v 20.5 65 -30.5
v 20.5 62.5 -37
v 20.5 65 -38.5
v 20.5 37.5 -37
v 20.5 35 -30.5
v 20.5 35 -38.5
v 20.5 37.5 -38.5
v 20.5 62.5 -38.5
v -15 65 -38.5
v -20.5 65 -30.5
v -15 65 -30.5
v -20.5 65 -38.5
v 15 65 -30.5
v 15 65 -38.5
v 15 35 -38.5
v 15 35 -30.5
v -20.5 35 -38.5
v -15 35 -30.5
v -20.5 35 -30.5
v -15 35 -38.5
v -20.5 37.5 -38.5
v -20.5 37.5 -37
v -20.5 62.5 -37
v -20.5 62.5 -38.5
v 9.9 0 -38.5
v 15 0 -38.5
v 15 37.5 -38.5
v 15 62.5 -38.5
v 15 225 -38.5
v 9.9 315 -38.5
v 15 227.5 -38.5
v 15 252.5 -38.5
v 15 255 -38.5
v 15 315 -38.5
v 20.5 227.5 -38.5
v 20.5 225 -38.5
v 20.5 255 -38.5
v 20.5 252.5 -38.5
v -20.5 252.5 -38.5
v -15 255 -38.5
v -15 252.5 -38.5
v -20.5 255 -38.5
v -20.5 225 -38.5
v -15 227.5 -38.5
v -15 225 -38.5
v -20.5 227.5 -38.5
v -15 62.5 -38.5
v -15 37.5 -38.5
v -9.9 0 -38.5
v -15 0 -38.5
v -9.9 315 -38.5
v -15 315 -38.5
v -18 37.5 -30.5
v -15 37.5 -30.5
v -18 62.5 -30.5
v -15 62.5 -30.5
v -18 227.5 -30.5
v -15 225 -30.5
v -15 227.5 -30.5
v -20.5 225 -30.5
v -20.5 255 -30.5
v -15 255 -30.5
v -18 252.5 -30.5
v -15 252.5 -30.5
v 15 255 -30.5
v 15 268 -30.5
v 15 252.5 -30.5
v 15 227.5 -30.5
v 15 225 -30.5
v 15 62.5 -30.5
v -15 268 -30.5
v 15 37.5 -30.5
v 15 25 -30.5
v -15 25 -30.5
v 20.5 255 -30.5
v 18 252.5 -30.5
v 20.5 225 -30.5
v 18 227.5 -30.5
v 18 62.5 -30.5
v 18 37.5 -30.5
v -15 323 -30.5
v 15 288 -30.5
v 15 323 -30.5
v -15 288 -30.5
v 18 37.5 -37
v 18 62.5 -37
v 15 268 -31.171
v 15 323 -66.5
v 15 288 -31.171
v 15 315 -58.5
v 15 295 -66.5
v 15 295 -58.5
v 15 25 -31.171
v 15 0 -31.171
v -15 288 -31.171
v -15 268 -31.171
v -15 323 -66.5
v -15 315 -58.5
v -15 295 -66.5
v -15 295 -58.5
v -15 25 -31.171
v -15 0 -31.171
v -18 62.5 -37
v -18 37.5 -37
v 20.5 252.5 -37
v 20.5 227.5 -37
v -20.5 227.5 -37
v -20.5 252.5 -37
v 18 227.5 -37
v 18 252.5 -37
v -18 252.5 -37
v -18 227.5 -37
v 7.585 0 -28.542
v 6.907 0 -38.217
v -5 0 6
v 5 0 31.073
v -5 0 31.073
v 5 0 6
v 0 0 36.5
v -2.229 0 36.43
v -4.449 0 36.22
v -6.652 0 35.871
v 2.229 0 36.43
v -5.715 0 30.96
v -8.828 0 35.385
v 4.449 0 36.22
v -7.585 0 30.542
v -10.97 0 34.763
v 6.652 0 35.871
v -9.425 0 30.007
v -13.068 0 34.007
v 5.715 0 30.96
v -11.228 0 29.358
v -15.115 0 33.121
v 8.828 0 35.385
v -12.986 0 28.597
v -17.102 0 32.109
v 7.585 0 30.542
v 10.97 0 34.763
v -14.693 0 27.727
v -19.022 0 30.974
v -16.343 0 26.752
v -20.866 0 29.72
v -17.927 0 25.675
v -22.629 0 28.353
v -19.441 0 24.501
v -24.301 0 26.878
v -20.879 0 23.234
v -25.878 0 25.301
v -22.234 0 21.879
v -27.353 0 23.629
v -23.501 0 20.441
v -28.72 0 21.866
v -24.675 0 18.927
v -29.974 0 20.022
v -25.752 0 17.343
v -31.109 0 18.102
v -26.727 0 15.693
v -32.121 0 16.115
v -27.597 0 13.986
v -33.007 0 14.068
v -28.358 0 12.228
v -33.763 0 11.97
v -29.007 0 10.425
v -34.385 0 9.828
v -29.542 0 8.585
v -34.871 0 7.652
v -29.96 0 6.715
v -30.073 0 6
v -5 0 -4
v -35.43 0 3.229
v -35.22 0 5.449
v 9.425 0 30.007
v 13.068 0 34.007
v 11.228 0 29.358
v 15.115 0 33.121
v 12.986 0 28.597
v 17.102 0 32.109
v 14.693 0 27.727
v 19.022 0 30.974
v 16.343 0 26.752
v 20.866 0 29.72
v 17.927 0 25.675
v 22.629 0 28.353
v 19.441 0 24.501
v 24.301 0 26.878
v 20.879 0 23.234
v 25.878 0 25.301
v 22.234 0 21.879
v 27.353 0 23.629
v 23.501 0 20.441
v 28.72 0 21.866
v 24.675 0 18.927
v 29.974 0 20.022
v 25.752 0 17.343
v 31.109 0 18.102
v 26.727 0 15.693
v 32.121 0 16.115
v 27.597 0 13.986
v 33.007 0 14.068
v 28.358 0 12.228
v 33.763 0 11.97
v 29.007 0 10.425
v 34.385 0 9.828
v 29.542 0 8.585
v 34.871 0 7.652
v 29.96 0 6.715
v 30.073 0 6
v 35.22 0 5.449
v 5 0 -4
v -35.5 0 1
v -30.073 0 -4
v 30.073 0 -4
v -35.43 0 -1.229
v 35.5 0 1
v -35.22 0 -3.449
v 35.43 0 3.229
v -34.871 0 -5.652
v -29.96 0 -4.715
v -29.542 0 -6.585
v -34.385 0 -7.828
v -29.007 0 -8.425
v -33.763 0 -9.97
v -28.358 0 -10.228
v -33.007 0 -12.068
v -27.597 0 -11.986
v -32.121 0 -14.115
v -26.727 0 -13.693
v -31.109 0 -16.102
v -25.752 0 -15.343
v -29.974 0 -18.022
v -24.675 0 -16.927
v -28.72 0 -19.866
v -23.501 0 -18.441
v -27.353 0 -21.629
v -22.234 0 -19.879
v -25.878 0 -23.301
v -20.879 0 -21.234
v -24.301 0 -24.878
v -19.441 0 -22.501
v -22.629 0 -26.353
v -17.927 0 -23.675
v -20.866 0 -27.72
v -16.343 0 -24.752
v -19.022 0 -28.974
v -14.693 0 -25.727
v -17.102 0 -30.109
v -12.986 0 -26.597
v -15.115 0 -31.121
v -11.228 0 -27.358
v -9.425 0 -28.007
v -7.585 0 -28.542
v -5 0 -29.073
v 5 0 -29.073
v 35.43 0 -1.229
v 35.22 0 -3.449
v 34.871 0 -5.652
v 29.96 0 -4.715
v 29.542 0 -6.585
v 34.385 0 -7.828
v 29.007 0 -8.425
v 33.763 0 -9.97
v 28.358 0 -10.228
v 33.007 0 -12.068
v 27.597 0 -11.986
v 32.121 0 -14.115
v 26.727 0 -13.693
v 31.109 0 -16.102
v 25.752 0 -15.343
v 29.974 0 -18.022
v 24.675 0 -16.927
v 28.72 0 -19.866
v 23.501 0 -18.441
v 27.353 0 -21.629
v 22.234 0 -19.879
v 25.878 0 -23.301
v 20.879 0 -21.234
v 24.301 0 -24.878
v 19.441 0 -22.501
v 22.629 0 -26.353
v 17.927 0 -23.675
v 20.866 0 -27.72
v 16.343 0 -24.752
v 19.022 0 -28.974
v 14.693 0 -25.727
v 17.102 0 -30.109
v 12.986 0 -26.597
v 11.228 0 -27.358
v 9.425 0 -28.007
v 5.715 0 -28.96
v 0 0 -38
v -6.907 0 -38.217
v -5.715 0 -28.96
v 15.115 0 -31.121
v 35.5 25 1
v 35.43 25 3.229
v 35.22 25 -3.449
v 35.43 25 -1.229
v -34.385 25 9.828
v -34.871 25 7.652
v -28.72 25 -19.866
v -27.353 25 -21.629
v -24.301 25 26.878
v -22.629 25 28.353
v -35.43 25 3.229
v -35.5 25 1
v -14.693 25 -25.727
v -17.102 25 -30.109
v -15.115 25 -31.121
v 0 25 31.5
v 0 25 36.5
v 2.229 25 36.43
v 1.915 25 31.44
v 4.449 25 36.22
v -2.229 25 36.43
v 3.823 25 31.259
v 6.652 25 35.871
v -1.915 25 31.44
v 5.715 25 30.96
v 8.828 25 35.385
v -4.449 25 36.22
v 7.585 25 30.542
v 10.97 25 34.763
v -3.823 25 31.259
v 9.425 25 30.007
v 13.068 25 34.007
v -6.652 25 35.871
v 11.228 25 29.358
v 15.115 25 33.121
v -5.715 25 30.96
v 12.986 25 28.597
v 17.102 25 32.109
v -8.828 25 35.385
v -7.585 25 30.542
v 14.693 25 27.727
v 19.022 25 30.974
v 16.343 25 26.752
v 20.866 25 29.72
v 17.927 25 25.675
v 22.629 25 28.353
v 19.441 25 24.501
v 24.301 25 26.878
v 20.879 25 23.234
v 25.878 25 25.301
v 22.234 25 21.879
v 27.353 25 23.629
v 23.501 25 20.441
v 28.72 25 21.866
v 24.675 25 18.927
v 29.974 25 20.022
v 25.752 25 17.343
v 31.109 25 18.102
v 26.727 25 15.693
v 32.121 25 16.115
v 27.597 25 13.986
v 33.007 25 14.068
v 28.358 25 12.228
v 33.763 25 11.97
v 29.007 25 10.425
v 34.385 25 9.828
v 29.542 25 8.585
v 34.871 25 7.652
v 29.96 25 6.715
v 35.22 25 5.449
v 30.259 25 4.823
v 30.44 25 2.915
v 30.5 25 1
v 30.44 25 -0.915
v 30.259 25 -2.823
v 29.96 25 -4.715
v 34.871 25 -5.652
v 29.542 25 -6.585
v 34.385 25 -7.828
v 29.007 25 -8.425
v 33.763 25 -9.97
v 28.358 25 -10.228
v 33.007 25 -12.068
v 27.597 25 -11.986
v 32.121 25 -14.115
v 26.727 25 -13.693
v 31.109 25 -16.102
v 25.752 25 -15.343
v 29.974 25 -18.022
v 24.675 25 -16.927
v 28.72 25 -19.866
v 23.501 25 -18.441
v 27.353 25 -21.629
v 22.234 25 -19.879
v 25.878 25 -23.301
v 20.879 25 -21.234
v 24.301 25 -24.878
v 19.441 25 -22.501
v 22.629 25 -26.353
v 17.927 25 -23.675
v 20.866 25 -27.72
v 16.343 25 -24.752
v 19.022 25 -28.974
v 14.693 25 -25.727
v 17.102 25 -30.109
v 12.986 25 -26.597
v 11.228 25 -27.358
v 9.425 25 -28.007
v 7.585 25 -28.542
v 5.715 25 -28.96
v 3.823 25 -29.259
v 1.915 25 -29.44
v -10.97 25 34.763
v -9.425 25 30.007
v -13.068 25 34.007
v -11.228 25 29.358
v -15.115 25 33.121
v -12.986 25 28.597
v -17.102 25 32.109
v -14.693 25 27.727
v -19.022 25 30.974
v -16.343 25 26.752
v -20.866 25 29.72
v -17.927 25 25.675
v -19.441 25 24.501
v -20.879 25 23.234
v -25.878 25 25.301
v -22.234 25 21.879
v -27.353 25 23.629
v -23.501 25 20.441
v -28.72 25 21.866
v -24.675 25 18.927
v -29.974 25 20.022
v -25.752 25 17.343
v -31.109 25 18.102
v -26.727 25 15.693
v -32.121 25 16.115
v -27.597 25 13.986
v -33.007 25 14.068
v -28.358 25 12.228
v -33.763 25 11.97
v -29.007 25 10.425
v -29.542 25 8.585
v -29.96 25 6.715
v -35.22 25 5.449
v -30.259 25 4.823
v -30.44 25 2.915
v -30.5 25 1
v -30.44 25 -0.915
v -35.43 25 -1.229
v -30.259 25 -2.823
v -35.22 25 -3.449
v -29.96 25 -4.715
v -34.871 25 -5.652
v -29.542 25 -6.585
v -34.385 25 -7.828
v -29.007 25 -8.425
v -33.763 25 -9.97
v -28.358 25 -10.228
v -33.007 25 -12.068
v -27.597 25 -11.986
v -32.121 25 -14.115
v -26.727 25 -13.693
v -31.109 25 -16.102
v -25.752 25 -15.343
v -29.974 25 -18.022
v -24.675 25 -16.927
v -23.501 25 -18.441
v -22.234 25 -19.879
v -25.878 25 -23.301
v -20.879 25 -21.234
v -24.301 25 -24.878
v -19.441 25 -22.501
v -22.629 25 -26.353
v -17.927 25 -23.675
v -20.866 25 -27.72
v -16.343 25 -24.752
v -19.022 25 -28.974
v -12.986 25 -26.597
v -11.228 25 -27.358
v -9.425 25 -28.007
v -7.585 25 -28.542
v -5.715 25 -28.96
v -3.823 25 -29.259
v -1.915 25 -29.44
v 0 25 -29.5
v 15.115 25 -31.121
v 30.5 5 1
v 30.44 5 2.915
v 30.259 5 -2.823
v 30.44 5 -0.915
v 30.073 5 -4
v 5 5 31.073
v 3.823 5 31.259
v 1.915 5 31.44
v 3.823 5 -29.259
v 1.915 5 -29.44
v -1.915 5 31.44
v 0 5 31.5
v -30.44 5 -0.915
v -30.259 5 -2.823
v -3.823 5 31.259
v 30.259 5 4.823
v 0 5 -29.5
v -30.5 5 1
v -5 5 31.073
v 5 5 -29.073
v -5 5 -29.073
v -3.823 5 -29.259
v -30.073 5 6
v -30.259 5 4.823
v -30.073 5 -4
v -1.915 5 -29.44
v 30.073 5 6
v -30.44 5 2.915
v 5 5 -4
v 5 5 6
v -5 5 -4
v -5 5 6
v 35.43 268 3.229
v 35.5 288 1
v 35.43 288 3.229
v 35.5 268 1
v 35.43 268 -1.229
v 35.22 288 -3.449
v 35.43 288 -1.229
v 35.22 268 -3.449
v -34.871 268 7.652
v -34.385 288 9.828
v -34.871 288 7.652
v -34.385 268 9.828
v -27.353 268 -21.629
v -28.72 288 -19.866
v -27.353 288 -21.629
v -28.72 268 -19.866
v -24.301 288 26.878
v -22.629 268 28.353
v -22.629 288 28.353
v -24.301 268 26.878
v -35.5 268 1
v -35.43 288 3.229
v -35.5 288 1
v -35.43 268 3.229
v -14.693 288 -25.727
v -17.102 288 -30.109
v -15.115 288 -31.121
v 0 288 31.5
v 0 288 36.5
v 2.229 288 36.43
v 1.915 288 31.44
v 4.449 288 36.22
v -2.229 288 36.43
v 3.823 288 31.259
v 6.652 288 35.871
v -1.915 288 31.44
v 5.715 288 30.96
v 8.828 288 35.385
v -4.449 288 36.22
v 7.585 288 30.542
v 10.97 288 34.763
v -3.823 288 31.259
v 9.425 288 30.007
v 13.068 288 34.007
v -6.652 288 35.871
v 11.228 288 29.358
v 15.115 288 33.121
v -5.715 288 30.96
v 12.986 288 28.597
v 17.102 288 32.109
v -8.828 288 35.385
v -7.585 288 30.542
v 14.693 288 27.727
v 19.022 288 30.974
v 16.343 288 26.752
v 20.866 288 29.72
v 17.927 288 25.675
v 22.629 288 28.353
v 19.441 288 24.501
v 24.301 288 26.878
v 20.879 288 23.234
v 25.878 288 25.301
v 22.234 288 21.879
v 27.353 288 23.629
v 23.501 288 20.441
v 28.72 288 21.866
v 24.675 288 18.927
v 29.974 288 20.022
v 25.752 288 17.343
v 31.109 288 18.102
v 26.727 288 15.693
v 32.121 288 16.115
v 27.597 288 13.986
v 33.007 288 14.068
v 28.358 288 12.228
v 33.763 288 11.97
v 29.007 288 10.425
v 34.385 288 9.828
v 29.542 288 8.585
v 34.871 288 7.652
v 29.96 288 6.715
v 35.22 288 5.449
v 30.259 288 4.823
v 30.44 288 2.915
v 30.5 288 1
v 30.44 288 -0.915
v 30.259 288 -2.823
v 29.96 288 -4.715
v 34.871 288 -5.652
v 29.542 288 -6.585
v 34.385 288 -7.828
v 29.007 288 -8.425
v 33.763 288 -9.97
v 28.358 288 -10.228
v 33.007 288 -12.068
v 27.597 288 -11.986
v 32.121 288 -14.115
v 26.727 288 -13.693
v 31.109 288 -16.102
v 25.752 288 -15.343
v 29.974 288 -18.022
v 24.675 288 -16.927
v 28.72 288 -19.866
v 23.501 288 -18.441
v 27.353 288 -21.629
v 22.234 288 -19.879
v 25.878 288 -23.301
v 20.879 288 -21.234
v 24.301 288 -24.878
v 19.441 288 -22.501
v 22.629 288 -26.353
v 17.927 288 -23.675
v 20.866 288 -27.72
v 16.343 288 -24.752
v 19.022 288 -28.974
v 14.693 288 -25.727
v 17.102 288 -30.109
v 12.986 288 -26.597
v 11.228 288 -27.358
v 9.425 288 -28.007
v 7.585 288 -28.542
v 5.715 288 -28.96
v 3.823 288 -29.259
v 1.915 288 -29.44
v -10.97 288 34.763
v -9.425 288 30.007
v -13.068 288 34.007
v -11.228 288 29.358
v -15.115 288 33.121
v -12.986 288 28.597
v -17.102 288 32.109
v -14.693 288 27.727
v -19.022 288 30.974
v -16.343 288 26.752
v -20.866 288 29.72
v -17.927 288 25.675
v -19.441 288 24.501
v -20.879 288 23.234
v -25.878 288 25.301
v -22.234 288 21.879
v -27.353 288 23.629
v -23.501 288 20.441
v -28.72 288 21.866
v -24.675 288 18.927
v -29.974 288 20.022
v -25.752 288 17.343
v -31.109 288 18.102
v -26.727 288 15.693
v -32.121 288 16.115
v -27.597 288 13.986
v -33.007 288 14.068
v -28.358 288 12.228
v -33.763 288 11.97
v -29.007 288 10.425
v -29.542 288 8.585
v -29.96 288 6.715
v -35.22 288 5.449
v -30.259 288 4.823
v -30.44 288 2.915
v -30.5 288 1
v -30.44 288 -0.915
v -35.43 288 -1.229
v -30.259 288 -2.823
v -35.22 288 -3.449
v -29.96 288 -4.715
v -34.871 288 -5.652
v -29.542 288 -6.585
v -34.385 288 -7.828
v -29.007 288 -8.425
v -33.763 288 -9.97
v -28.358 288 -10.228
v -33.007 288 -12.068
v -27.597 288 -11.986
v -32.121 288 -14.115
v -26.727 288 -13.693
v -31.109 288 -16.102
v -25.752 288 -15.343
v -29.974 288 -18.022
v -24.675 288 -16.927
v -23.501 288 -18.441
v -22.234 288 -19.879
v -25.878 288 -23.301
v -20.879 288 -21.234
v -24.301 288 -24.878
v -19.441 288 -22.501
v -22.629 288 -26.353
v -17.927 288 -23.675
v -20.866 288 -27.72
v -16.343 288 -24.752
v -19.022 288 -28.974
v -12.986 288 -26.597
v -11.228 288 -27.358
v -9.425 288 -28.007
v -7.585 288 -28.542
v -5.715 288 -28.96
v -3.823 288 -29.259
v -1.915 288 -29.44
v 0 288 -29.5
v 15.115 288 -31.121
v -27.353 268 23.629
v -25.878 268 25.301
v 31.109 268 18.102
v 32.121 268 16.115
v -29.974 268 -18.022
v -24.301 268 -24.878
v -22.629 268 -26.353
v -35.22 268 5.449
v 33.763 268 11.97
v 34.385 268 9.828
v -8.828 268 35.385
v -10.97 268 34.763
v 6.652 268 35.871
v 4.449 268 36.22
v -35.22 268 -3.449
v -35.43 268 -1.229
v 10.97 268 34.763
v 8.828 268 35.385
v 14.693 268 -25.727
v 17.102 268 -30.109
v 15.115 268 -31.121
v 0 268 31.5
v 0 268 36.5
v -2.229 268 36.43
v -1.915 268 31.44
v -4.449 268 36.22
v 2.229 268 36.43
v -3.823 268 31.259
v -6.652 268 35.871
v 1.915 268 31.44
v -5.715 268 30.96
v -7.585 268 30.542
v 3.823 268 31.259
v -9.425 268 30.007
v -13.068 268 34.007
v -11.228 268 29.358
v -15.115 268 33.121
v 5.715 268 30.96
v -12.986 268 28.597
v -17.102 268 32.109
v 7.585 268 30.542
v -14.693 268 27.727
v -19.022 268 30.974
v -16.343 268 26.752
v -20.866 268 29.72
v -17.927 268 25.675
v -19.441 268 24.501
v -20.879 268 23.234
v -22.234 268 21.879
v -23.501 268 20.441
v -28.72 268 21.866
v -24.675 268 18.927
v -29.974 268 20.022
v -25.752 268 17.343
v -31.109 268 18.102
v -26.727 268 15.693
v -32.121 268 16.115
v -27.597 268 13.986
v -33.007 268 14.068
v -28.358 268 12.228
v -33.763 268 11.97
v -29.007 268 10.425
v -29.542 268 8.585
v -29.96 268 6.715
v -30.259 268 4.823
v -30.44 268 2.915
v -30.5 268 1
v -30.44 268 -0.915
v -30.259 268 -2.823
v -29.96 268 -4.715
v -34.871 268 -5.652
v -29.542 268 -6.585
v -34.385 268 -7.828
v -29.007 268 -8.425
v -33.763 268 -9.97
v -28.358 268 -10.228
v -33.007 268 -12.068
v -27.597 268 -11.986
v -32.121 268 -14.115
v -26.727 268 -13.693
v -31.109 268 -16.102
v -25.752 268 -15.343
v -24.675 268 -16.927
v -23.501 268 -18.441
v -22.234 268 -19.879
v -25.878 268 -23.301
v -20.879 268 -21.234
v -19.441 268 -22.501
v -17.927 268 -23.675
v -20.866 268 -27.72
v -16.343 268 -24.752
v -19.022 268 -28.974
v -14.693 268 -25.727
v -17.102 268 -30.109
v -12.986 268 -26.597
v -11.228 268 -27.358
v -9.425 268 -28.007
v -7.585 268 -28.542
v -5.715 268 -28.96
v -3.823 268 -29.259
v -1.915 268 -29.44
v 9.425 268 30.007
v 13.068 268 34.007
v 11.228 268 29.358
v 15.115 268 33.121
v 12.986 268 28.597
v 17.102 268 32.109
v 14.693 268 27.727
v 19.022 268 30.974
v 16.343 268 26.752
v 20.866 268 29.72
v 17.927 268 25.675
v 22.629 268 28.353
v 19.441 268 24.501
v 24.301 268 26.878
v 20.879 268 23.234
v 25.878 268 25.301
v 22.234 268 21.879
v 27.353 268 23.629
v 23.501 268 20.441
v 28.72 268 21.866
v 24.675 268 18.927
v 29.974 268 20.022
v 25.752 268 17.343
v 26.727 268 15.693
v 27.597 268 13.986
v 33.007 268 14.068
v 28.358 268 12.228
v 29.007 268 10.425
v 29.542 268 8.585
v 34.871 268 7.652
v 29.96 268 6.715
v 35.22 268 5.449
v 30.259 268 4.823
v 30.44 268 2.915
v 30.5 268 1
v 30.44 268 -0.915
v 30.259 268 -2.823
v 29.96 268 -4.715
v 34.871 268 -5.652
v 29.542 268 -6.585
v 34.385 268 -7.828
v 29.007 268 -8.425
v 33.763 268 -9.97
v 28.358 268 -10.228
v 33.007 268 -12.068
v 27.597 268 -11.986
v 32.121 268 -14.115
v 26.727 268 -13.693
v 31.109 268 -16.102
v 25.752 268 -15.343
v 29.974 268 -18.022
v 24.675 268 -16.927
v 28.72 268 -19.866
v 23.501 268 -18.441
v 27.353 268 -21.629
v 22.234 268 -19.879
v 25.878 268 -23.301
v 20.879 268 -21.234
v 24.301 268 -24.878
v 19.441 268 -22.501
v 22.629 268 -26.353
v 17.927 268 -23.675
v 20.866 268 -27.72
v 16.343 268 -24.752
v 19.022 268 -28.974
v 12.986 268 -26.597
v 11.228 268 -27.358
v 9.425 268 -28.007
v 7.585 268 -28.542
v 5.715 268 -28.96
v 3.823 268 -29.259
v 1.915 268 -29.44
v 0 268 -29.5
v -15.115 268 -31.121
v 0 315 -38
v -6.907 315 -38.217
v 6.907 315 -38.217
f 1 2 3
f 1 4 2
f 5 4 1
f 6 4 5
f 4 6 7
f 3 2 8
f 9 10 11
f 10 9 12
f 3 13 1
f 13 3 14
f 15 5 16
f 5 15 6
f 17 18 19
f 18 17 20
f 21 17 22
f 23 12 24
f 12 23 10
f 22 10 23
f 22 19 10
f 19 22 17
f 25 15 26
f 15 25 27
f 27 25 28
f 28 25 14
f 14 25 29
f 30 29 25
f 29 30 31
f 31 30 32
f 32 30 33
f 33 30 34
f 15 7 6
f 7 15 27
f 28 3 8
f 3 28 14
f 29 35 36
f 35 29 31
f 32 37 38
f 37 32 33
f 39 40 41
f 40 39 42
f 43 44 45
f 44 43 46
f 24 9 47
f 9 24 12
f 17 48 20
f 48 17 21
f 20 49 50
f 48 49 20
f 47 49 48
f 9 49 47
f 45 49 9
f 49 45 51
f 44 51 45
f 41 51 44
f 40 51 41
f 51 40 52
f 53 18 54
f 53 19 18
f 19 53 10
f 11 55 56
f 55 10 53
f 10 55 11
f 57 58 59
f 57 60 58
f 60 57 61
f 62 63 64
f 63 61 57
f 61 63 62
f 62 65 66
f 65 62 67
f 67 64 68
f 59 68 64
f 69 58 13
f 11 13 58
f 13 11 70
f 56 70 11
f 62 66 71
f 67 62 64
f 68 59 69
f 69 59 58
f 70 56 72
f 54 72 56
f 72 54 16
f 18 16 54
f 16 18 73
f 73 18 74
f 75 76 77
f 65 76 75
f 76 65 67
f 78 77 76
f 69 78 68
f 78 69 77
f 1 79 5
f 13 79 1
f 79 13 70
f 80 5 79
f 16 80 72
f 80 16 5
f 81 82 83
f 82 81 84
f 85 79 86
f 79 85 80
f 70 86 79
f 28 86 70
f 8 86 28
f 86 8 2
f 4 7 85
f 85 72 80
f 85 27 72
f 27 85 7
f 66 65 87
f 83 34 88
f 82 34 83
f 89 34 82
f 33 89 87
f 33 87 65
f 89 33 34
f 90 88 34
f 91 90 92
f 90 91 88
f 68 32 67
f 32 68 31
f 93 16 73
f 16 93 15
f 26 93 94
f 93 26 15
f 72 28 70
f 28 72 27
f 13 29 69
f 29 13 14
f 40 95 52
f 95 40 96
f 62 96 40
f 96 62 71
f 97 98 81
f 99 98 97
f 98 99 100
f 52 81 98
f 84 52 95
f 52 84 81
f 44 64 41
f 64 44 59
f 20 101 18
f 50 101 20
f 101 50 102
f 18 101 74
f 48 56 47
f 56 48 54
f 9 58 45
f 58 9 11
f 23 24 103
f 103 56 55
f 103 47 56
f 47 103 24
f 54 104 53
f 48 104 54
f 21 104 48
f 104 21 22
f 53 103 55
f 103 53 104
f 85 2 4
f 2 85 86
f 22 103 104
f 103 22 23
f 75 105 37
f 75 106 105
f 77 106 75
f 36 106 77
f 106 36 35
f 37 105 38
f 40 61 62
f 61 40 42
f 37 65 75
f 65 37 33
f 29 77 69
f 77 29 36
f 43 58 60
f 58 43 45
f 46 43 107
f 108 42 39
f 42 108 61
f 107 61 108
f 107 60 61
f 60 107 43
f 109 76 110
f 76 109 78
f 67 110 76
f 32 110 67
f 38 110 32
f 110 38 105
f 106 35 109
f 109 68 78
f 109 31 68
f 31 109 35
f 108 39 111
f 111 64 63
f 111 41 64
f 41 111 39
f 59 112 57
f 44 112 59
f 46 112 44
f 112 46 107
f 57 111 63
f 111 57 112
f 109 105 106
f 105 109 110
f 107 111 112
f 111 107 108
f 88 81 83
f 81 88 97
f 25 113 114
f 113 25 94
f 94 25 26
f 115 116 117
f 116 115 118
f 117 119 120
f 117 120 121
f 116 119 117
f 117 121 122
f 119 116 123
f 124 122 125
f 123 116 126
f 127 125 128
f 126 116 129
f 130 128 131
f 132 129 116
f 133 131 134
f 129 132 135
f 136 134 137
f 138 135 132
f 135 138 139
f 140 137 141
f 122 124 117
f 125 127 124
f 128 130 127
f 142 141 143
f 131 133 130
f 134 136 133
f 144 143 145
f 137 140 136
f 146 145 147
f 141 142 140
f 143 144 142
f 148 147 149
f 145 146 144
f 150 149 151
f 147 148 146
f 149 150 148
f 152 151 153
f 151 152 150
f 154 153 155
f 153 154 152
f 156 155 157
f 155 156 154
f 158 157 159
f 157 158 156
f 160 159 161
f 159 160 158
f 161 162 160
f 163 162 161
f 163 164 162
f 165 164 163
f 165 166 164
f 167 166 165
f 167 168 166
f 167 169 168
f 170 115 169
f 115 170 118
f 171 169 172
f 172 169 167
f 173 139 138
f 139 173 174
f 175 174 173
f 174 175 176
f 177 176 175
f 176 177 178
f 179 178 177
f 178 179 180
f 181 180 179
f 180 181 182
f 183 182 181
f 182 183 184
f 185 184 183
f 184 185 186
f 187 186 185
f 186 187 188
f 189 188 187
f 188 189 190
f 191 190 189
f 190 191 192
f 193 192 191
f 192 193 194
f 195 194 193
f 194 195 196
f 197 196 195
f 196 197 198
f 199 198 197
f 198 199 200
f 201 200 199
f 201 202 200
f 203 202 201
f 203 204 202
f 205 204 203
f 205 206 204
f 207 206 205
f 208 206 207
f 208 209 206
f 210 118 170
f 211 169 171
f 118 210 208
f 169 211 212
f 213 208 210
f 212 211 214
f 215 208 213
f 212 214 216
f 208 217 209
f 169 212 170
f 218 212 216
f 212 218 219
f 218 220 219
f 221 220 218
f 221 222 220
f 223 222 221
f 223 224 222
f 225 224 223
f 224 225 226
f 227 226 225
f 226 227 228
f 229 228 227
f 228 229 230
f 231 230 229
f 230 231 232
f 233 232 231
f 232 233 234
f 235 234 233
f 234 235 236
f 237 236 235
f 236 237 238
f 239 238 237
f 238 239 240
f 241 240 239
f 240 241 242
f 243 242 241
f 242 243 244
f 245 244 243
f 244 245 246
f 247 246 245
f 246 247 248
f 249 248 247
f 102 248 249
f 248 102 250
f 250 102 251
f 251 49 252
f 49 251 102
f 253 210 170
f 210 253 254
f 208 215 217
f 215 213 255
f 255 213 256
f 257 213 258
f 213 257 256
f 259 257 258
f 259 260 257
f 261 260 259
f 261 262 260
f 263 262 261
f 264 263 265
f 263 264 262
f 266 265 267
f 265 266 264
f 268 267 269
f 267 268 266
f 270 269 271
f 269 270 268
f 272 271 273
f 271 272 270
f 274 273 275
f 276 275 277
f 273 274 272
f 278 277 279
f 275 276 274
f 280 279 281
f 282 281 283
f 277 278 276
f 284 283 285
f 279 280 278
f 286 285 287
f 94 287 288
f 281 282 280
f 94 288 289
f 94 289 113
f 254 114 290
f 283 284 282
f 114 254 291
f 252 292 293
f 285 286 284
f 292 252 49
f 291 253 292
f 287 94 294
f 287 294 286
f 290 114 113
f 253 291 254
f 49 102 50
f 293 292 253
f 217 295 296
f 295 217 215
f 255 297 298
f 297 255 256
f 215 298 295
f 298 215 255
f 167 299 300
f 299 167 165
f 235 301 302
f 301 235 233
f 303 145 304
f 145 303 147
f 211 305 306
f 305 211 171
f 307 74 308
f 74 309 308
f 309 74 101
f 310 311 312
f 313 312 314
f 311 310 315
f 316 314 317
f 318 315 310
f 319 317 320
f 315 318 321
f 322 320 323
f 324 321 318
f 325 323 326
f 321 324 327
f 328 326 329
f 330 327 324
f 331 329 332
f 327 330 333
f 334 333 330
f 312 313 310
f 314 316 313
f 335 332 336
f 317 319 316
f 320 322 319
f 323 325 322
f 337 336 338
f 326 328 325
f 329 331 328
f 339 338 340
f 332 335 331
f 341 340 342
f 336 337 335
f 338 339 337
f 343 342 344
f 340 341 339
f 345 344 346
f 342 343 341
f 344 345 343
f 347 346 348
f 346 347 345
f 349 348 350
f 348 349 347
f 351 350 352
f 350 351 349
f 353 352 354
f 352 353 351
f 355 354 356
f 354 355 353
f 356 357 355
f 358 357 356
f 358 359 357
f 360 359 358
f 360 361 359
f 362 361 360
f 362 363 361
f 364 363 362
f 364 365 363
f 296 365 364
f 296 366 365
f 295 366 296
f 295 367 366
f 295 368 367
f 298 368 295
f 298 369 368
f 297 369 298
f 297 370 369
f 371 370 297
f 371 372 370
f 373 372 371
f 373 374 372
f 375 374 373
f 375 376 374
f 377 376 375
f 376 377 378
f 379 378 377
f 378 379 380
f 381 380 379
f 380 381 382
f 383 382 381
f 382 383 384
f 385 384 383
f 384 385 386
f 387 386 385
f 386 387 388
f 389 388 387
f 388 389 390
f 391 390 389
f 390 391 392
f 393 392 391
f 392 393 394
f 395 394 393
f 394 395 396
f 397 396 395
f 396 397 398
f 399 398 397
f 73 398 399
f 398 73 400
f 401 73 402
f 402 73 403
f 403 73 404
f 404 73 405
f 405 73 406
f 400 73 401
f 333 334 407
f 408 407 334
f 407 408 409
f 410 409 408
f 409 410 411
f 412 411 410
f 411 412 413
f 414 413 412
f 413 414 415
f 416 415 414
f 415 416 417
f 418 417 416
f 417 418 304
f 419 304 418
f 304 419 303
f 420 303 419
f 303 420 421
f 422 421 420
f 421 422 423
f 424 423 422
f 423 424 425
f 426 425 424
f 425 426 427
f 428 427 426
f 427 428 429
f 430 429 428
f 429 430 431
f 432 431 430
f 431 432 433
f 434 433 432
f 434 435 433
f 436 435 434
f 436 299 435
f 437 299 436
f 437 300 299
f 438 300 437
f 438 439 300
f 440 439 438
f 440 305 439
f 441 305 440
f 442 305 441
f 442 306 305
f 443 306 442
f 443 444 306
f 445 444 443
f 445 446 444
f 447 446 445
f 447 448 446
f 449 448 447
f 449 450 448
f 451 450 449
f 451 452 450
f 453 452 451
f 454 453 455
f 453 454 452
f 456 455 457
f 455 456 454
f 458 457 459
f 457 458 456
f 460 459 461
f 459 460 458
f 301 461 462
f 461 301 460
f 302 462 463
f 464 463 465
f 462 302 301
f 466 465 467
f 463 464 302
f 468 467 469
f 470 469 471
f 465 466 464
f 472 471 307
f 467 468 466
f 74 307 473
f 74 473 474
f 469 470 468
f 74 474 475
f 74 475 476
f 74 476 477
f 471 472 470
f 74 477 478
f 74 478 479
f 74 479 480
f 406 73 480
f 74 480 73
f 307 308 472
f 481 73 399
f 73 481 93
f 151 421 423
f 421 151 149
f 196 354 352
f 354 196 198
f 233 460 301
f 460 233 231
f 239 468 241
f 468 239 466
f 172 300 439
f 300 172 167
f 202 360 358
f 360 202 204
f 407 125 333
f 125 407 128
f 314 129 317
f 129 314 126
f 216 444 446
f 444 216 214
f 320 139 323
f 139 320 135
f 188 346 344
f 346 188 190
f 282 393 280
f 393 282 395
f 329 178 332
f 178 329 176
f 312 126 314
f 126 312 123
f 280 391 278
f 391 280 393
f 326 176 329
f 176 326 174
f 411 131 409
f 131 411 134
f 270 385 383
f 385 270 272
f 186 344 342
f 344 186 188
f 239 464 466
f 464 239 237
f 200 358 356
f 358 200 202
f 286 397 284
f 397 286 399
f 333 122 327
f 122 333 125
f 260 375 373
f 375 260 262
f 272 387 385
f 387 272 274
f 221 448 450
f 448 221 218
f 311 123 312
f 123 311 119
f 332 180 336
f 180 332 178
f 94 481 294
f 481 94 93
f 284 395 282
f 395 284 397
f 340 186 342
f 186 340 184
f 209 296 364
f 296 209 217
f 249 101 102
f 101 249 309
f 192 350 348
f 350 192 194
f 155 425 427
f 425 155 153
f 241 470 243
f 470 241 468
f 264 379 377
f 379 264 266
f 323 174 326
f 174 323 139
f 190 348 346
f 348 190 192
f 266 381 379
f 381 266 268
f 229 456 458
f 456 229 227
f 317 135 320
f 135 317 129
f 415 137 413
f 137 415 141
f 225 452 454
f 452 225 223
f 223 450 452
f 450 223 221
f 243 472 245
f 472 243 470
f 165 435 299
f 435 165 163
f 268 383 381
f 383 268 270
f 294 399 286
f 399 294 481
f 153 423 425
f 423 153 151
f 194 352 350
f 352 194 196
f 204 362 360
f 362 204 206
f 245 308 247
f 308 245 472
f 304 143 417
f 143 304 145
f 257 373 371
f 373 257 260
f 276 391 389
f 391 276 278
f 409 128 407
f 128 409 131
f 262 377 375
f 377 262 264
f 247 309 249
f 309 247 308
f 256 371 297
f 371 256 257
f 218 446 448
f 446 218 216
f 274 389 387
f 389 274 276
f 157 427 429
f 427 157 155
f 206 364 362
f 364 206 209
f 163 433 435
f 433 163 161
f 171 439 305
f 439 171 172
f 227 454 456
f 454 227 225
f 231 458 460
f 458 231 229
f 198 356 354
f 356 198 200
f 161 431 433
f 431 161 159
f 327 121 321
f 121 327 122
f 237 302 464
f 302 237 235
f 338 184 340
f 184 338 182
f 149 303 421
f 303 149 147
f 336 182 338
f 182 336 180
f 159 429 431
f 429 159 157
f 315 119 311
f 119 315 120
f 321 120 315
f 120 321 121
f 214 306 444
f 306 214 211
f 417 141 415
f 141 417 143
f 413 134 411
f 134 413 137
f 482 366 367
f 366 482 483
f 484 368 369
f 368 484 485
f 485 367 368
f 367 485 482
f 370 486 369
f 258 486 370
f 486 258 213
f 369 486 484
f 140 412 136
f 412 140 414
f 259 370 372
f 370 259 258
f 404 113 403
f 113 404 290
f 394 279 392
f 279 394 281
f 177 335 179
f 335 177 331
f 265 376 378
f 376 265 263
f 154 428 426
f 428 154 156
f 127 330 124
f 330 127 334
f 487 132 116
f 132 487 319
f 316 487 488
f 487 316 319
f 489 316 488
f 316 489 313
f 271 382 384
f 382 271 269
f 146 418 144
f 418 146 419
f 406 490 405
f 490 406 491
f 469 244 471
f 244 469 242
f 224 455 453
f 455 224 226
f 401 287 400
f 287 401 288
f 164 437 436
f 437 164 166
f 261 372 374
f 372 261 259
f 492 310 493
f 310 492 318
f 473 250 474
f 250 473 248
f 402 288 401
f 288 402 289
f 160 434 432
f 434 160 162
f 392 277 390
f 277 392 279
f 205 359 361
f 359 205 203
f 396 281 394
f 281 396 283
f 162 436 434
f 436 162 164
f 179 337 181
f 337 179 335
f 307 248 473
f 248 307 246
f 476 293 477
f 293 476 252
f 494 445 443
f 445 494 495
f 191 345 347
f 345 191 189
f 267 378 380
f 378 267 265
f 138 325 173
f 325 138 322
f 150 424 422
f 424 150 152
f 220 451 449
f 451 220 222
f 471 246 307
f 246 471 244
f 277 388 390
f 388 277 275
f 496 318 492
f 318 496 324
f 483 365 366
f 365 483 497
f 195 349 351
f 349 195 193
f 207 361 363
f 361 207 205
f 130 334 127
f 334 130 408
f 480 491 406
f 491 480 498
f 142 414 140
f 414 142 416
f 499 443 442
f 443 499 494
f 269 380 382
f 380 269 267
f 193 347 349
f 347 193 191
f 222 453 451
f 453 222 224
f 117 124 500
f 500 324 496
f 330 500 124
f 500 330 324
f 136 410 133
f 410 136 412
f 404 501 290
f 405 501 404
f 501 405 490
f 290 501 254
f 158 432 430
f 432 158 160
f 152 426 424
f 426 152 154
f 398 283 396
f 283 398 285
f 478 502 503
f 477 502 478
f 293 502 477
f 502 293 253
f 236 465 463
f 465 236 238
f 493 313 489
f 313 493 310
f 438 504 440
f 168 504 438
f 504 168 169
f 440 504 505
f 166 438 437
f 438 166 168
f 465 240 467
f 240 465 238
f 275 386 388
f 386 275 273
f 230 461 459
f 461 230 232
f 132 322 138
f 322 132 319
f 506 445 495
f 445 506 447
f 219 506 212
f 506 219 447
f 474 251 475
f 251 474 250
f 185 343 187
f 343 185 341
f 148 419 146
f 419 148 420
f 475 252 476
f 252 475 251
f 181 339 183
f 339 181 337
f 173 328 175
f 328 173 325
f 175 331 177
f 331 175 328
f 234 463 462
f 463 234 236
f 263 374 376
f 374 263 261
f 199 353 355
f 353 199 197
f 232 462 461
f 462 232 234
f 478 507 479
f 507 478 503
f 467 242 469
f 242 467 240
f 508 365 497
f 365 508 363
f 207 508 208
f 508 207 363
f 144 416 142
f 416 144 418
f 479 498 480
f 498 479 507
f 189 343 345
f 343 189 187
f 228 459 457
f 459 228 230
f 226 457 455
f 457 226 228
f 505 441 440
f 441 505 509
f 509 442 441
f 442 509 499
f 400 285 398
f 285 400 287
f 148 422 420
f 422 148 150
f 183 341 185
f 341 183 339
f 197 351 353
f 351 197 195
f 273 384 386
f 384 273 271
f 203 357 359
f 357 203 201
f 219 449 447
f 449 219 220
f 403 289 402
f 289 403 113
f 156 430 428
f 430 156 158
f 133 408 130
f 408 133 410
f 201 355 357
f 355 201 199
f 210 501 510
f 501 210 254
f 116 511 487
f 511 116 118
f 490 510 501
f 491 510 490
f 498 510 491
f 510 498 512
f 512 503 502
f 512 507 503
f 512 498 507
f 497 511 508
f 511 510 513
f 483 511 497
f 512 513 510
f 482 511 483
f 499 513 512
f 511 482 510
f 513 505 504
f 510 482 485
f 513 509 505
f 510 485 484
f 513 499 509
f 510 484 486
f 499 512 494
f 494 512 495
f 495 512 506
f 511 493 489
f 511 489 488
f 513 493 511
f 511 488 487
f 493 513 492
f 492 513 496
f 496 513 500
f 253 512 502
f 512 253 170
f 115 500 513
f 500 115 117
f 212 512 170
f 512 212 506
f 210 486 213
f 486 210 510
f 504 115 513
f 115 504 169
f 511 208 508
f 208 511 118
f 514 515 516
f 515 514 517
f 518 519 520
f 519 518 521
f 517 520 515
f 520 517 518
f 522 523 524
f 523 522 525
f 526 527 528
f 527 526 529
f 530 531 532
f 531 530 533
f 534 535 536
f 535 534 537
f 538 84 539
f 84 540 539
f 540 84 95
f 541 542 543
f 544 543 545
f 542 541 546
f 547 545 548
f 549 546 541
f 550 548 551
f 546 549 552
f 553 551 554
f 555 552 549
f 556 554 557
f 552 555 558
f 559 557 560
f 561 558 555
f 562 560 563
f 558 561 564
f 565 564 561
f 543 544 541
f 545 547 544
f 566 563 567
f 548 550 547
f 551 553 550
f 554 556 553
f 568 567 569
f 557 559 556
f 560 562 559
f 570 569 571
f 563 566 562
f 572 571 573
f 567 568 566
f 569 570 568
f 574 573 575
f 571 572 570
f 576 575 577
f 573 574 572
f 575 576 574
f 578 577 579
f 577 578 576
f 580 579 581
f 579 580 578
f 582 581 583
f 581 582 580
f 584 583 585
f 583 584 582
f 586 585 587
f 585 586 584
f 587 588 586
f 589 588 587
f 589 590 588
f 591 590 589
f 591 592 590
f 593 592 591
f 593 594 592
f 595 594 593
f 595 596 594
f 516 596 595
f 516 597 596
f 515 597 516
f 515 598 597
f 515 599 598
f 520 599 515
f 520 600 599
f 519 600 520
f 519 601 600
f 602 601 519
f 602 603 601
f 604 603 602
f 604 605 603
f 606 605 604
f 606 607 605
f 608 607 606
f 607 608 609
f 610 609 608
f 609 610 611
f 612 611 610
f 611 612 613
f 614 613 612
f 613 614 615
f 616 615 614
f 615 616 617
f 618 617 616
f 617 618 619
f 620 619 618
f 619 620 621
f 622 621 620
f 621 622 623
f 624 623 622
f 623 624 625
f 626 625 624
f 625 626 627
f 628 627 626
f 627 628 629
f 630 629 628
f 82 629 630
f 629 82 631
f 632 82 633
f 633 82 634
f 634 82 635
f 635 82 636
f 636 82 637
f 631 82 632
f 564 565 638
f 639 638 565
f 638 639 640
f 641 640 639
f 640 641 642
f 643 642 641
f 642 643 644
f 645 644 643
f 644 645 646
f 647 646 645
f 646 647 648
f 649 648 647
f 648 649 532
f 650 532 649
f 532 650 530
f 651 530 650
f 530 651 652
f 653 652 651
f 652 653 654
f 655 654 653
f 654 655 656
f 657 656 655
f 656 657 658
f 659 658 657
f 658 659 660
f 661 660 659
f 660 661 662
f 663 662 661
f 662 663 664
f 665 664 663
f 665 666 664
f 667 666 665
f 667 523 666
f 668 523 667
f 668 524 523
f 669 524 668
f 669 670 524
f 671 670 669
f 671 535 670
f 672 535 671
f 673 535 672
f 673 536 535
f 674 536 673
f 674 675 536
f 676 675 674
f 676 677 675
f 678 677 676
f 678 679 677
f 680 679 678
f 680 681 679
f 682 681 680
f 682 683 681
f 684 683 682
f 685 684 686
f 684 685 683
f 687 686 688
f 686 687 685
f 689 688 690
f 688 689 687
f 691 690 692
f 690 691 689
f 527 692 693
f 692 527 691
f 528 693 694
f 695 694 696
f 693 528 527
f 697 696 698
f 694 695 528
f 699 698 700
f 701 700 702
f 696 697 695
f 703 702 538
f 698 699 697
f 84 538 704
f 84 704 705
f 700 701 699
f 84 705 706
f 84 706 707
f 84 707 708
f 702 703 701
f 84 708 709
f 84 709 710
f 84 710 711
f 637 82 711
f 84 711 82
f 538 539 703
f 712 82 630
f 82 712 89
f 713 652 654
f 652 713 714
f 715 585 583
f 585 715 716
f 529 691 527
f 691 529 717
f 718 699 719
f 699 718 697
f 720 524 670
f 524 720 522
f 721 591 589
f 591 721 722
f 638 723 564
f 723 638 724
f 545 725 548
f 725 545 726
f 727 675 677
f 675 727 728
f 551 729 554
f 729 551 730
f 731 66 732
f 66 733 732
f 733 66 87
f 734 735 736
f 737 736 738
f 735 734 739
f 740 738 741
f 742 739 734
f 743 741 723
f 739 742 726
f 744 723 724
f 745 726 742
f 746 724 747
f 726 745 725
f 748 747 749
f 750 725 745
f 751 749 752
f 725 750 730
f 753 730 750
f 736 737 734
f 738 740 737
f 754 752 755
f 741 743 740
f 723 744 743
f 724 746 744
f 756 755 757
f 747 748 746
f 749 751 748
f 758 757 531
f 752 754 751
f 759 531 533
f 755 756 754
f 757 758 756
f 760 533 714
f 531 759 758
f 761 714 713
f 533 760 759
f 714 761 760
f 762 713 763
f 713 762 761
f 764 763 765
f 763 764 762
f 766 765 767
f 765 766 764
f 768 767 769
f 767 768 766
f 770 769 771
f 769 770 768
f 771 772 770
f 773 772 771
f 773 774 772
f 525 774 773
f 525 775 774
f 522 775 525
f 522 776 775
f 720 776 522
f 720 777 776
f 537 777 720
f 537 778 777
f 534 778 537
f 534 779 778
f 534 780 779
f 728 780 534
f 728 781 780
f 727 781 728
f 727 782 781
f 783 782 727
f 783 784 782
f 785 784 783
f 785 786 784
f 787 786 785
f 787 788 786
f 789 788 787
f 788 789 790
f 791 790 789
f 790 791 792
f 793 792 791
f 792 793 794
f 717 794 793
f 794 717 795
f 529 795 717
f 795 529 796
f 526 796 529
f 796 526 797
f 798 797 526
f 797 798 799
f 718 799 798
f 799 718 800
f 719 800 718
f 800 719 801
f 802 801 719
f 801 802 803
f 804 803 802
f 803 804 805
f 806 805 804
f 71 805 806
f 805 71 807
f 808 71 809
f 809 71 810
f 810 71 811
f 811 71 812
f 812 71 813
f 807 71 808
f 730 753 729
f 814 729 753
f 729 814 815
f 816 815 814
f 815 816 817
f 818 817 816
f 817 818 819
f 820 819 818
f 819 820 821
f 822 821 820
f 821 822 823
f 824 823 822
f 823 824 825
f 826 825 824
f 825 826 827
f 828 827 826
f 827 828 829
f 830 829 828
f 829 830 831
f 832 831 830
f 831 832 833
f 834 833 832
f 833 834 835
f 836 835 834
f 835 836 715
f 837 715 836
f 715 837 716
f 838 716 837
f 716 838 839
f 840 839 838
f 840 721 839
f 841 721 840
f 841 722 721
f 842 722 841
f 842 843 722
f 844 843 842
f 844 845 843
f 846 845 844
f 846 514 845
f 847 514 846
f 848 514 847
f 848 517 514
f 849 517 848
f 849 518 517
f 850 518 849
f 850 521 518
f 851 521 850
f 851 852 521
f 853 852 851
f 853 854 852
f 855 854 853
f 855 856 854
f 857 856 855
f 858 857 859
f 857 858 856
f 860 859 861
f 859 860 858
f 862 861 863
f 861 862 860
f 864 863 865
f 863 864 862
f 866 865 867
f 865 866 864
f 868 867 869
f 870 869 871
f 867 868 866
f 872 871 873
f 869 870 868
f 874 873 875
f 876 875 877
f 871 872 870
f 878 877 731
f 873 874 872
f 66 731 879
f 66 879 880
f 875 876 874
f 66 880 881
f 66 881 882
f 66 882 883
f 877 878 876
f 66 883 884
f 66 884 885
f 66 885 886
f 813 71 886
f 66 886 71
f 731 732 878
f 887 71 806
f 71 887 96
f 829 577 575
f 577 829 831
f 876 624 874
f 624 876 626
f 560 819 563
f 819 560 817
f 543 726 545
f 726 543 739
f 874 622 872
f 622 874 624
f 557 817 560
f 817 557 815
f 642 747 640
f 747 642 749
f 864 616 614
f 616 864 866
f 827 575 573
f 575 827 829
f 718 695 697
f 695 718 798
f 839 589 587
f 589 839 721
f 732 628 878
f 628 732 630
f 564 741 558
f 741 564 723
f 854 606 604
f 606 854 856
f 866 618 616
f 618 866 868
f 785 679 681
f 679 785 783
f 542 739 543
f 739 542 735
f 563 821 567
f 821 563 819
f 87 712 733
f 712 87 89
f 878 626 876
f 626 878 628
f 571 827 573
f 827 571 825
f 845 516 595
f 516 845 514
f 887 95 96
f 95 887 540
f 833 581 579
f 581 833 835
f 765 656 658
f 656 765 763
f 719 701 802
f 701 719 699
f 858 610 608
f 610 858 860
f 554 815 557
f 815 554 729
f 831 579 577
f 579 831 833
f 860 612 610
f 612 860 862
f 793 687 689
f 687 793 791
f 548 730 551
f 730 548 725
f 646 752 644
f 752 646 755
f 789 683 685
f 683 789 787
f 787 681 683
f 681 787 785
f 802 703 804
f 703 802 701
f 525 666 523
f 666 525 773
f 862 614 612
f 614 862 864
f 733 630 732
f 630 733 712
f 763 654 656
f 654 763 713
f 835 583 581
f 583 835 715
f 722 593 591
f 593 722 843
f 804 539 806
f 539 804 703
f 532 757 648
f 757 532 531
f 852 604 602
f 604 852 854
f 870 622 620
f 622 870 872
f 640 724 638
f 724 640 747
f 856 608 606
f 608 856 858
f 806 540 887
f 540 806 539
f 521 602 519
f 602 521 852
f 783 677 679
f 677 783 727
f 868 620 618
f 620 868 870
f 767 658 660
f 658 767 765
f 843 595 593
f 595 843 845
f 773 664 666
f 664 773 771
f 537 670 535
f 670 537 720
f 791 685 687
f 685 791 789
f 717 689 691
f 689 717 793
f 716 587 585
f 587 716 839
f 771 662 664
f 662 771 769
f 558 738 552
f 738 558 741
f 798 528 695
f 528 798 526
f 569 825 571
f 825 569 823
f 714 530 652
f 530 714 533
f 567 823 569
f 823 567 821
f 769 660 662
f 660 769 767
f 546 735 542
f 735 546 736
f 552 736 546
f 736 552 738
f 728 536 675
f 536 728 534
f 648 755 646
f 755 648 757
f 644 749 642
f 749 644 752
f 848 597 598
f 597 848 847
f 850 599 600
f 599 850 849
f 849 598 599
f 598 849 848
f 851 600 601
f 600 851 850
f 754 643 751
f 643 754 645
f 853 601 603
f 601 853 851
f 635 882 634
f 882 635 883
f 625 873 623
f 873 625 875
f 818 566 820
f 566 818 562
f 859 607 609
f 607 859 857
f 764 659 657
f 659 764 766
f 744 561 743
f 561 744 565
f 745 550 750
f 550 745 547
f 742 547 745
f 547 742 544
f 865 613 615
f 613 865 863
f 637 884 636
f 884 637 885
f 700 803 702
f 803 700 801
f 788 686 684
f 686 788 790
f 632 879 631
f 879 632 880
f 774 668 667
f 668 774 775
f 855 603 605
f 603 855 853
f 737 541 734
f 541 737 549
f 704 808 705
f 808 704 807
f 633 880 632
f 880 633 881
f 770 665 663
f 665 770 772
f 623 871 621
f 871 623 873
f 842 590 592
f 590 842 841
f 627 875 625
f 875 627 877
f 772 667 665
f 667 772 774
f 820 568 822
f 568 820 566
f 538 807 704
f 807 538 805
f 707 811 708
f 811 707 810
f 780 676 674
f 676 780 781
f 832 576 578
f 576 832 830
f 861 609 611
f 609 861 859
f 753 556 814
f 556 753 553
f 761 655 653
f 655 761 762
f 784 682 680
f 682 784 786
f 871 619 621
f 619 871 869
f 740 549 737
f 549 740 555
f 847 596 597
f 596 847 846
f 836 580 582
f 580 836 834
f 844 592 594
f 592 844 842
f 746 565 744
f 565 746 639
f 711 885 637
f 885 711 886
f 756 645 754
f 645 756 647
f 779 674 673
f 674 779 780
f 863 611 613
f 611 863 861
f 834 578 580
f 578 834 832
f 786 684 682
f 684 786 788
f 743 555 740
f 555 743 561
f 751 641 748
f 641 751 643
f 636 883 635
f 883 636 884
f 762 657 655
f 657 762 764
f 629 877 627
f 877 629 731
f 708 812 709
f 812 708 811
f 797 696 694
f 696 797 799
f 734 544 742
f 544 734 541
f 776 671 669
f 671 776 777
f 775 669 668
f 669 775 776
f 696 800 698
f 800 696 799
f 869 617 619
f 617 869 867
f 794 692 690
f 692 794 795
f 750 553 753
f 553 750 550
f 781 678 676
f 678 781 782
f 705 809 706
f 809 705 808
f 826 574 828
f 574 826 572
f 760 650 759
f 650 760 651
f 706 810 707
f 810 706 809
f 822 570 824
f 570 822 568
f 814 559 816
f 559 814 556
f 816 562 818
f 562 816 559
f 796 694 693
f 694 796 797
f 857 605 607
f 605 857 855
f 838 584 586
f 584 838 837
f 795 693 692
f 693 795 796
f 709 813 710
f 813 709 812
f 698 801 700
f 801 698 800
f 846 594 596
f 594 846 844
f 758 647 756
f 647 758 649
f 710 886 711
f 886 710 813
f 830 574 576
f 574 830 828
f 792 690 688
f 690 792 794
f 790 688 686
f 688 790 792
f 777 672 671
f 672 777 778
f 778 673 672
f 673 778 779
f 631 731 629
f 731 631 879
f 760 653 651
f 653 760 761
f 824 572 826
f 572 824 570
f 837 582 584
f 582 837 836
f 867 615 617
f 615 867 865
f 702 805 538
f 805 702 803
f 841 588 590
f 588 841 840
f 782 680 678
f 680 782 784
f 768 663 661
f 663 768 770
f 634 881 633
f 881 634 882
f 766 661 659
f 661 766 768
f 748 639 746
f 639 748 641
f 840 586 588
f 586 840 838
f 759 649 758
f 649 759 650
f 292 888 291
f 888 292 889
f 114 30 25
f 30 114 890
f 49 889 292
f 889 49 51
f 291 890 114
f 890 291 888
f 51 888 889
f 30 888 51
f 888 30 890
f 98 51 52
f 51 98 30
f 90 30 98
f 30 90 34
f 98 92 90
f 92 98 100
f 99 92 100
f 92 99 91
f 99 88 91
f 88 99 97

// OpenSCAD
// file: libs/hugo_dovetail.scad
/**
 *  Dovetail parametric generator for OpenScad
 *  Générateur de queue d'aronde pour OpenScad
 *
 *  Copyright (c) 2012 Charles Rincheval.  All rights reserved.
 *
 *  This library is free software; you can redistribute it and/or
 *  modify it under the terms of the GNU Lesser General Public
 *  License as published by the Free Software Foundation; either
 *  version 2.1 of the License, or (at your option) any later version.
 *
 *  This library is distributed in the hope that it will be useful,
 *  but WITHOUT ANY WARRANTY; without even the implied warranty of
 *  MERCHANTABILITY or FITNESS FOR A PARTICULAR PURPOSE.  See the GNU
 *  Lesser General Public License for more details.
 *
 *  You should have received a copy of the GNU Lesser General Public
 *  License along with this library; if not, write to the Free Software
 *  Foundation, Inc., 51 Franklin St, Fifth Floor, Boston, MA  02110-1301  USA
 *
 *  Last update :
 *  https://github.com/hugokernel/OpenSCAD_Dovetail
 *
 *  http://www.digitalspirit.org/
 */

/**
 *  Create one teeth
 *  @param int width        Teeth width
 *  @param int height       Teeth height
 *  @param int thickness    Teeth thickness
 */
module dovetail_teeth(width, height, thickness) {
    offset = width / 3;
    translate([- width / 2, - height / 2, 0]) {
        linear_extrude(height = thickness) {
            polygon([[0, 0], [width, 0], [width - offset, height], [offset, height]]);
        }
    }
}


/**
 *  Dovetail
 *  @param int  width           Dovetail width
 *  @param int  teeth_count     Teeth count
 *  @param int  teeth_height    Teeth height
 *  @param int  teeth_thickness Teeth thickness
 *  @param int  clear           Teeth clear
 *  @param bool male            Get male (true) or female (false)
 */
module dovetail(width, teeth_count, teeth_height, teeth_thickness, clear = 0.1, male = true) {

    /**
     * 4 sections :
     *
     * |1/2         1/2|
     * |--+ <- 3 -> +--|--+         +--
     * |   \1  1  1/   |   \       /
     * |    \_____/    |    \_____/
     */

    y = ((width - teeth_count * 2 * clear) / teeth_count) / 4;

    compensation = - 0.1;
    teeth_width = y * 3;

    // Always width / 3 (ref. dovetail_teeth())
    offset = teeth_width / 3;
    start_at = clear * 2 + teeth_width / 2 - width / 2 - clear;

    translate([0, 0, - teeth_thickness / 2]) {

        // Debug purpose only
        % union() {
            translate([- width / 2, 0, - width / 2]) cube(size = [width, 0.01, width]);
        }

        for (i = [-1 : teeth_count * 2 - 1] ) {
            if (i % 2) {
                assign(x = start_at + y / 2 + (teeth_width - offset + clear) * i + 0.1) {
                    translate([x + compensation, - clear, 0]) {
                        rotate([0, 0, 180]) {
                            if (male == true) {
                                dovetail_teeth(teeth_width - clear, teeth_height - clear, teeth_thickness);
                            }
                        }
                    }
                }
            } else {
                assign(x = start_at + y / 2 + (teeth_width - offset + clear) * i) {
                    translate([x, clear, 0]) {
                        if (male == false) {
                            dovetail_teeth(teeth_width - clear, teeth_height - clear, teeth_thickness);
                        }
                    }
                }
            }
        }
    }
}

/**
 *  Cut piece
 *  @param vector position  Cut position ([x, y, z])
 *  @param vector dimension Dimension of bounding box ([w, l, h])
 *  @param vector teeths    Teeths parameters ([count, height, clearance])
 *  @param bool   male      Get male (true) or female (false)
 */
module cutter(position, dimension, teeths, male = true) {
    translate(position) {
        dovetail(dimension[0], teeths[0], teeths[1], dimension[2], teeths[2], male);

        if (male) {
            translate([- dimension[0] / 2, - (teeths[1] / 2 - 0.1) - dimension[1], - dimension[2] / 2]) {
                cube(size = dimension);
            }
        } else {
            translate([- dimension[0] / 2, teeths[1] / 2 - 0.1, , - dimension[2] / 2]) {
                cube(size = dimension);
            }
        }
    }
}


module demo() {
    dim = [20, 60, 5];
    clear = 0.3;

    /**
     * [x, y, z]
     * - x : Teeth count
     * - y : Teeth height
     * - z : Teeth Clearance
     */
    teeth = [3, 4, clear];

    % cube(size = dim, center = true);

    color("GREEN") intersection() {
        cube(size = dim, center = true);
        cutter([0, -10, 0], dim, teeth, true);
    }

    //translate([22, 0, 0])
    color("RED") intersection() {
        cube(size = dim, center = true);
        cutter([0, -10, 0], dim, teeth, false);
        cutter([0, 10, 0], dim, teeth, true);
    }

    //translate([44, 0, 0])
    color("BLUE") intersection() {
        cube(size = dim, center = true);
        cutter([0, 10, 0], dim, teeth, false);
    }
}


//demo();
// main file
//include <libs/randy_lib.scad>
//include <libs/dovetail.scad>
include <libs/hugo_dovetail.scad>

$fn=100;

BASE_WIDTH = 61;
BASE_HEIGHT = 20;

THICKNESS_BASE = 5;
THICKNESS_WALL = 5;
BASE_SUPPORT_WIDTH = 10;
CUT_SPACING = 10;
HOLE_DIAMETER = BASE_HEIGHT - THICKNESS_WALL;

HOOK_DEPTH = 20;
HOOK_HEIGHT = 20;

HOLDER_THICKNESS = 8;
HOLDER_HEIGHT = 280 + THICKNESS_BASE + HOLDER_THICKNESS + HOOK_HEIGHT + CUT_SPACING;
//HOLDER_HEIGHT = 240;
HOLDER_WIDTH = 30;
HOLDER_POSITION = BASE_WIDTH / 2 + HOLDER_THICKNESS / 2;

KEG_RADIUS = 110;

COLLAR_HEIGHT = 20;


STRAP_WIDTH = 25;
STRAP_THICKNESS = 3;
STRAP_BUCKLE_WALL = 5;
STRAP_BUCKLE_WIDTH = HOLDER_WIDTH + STRAP_THICKNESS * 2 + STRAP_BUCKLE_WALL;
STRAP_BUCKLE_HEIGHT = STRAP_WIDTH + STRAP_BUCKLE_WALL;
//LOWER_BUCKLE_POSITION = HOLDER_HEIGHT / 2;
LOWER_BUCKLE_POSITION = BASE_HEIGHT + THICKNESS_BASE + STRAP_BUCKLE_HEIGHT / 2 + CUT_SPACING;
UPPER_BUCKLE_POSITION = HOLDER_HEIGHT - HOLDER_THICKNESS - HOOK_HEIGHT - COLLAR_HEIGHT - STRAP_BUCKLE_HEIGHT / 2 - CUT_SPACING * 2;

//CUTS = [[0, 150, 0], [0, 260, 0], [0, 290, 0]];
CUTS = [[0, 150, 0], [0, 290, 0]];
DOVETAIL_CLEAR = 0.3;
DOVETAIL_TEETH = [10, 4, DOVETAIL_CLEAR];

OUTER_DIAMETER = BASE_WIDTH + THICKNESS_WALL * 2;
//CUT_CUBE_DIM = [OUTER_DIAMETER + 10, 250, OUTER_DIAMETER + 10];
CUT_CUBE_DIM = [89, 150, 160];

// Hanger
module hanger() {
    translate([0, HOLDER_POSITION, HOLDER_HEIGHT / 2]) {
        cube(size = [HOLDER_WIDTH, HOLDER_THICKNESS, HOLDER_HEIGHT], center = true);
    }
    
    // Lower strap buckle
    translate([0, HOLDER_POSITION, LOWER_BUCKLE_POSITION]) {
        strap_buckle();
    }

    // Upper strap buckle
    translate([0, HOLDER_POSITION, UPPER_BUCKLE_POSITION]) {
        strap_buckle();
    }
}

module base() {
    // Collar
    difference() {
        cylinder(h=THICKNESS_BASE + BASE_HEIGHT, d=OUTER_DIAMETER);
        
        cylinder(h=BASE_HEIGHT + BASE_HEIGHT, d=BASE_WIDTH);
     }
    
    // Base supports
    translate([0, 0, THICKNESS_BASE / 2]) {
        cube([BASE_SUPPORT_WIDTH, BASE_WIDTH + THICKNESS_WALL, THICKNESS_BASE], center=true);
        rotate([0, 0, 90])
            cube([BASE_SUPPORT_WIDTH, BASE_WIDTH + THICKNESS_WALL, THICKNESS_BASE], center=true);
    }
}

module collar() {
    translate([0, 0, HOLDER_HEIGHT - COLLAR_HEIGHT - HOOK_HEIGHT - THICKNESS_WALL - CUT_SPACING]) {
        
        difference() {
            cylinder(h=COLLAR_HEIGHT, d=OUTER_DIAMETER);
            
            cylinder(h=COLLAR_HEIGHT, d=BASE_WIDTH);
        }
    }    
}

module strap_buckle() {
    difference() {
        cube([STRAP_BUCKLE_WIDTH, HOLDER_THICKNESS, STRAP_BUCKLE_HEIGHT], center=true);

        // Strap holes
        translate([HOLDER_WIDTH / 2 + STRAP_THICKNESS / 2, 0, 0]) {
            cube([STRAP_THICKNESS, HOLDER_THICKNESS, STRAP_WIDTH], center = true);
        }
        translate([0 - (HOLDER_WIDTH / 2 + STRAP_THICKNESS / 2), 0, 0 ]) {
            cube([STRAP_THICKNESS, HOLDER_THICKNESS, STRAP_WIDTH], center = true);
        }
        
        // Make room for straps behind buckle
        strap_hole_pos = HOLDER_THICKNESS / 2 - STRAP_THICKNESS / 2 + 1;
        translate([HOLDER_WIDTH / 2 + STRAP_THICKNESS, strap_hole_pos, 0]) {
            cube([STRAP_BUCKLE_WALL, 2, STRAP_WIDTH], center = true);
        }
        translate([0 - (HOLDER_WIDTH / 2 + STRAP_THICKNESS), strap_hole_pos, 0]) {
            cube([STRAP_BUCKLE_WALL, 2, STRAP_WIDTH], center = true);
        }
        
    }
    
}

module hook() {
    // Horizontal lip
    translate([0, (BASE_WIDTH + HOOK_DEPTH) / 2 + HOLDER_THICKNESS, HOLDER_HEIGHT - HOLDER_THICKNESS / 2]) {
        cube([HOLDER_WIDTH, HOOK_DEPTH, HOLDER_THICKNESS], center = true);
    }
    
    // Vertical hook
    translate([0, BASE_WIDTH / 2 + HOOK_DEPTH + HOLDER_THICKNESS * 1.5, HOLDER_HEIGHT - HOOK_HEIGHT / 2 - HOLDER_THICKNESS / 2]) {
        cube([HOLDER_WIDTH, HOLDER_THICKNESS, HOOK_HEIGHT + HOLDER_THICKNESS], true);
    } 
}

module holder() {
    /*
    difference() {
        hanger();
        
        // Strap groove for lower buckle
        translate([0, BASE_WIDTH / 2 + 1, LOWER_BUCKLE_POSITION]) {
            cube([HOLDER_WIDTH, 2, STRAP_WIDTH], center = true);
        }

        // Strap groove for upper buckle
        translate([0, BASE_WIDTH / 2 + 1, UPPER_BUCKLE_POSITION]) {
            cube([HOLDER_WIDTH, 2, STRAP_WIDTH], center = true);
        }

    }
    */
    hanger();
    translate([0, -1, 0]) base();
    translate([0, -1, 0]) collar();
}

module drawHolder() {
    // Curved back of holder
    difference() {
        holder();
        
        // Make back rounded to fit keg
        translate([0, BASE_WIDTH / 2 + HOLDER_THICKNESS + KEG_RADIUS - 0.5, 0]) {
            cylinder(h=HOLDER_HEIGHT - HOLDER_THICKNESS, r=KEG_RADIUS, center=false);
        }
    }

    // Add hook (outside of holder, to not be in the way for the curved back)
    hook();
    //
    //translate([50,50,50]) {
    //    strap_buckle();
    //}
    
}

// Cut with dovetail
module addCut() {
    translate([0, HOLDER_POSITION, CUT_HEIGHT])
    rotate([-90,-90,0]) {
        dovetail(DOVETAIL_WIDTH, HOLDER_THICKNESS, true);
        //dovetail(HOLDER_WIDTH, 10, false);
    }
}
//addCut();


module rotatedHolder() {
    //translate([0, 0, - OUTER_DIAMETER / 2])
        rotate([-90, 0, 0])
            drawHolder();
}

module cutHolder() {
    intersection() {
        rotatedHolder();
        cutter(CUTS[0], CUT_CUBE_DIM, DOVETAIL_TEETH, true);
    }
//    intersection() {
//        rotatedHolder();
//        cutter(CUTS[0], CUT_CUBE_DIM, DOVETAIL_TEETH, false);
//        cutter(CUTS[1], CUT_CUBE_DIM, DOVETAIL_TEETH, true);
//    }
//    intersection() {
//        rotatedHolder();
//        cutter(CUTS[1], CUT_CUBE_DIM, DOVETAIL_TEETH, false);
//        //cutter(CUTS[2], CUT_CUBE_DIM, DOVETAIL_TEETH, true);
//    }
    
    // Third cut
    //intersection() {
    //    rotatedHolder();
    //    cutter(CUTS[2], CUT_CUBE_DIM, DOVETAIL_TEETH, false);
    //}
}

//cutHolder();
rotatedHolder();
//drawHolder();
